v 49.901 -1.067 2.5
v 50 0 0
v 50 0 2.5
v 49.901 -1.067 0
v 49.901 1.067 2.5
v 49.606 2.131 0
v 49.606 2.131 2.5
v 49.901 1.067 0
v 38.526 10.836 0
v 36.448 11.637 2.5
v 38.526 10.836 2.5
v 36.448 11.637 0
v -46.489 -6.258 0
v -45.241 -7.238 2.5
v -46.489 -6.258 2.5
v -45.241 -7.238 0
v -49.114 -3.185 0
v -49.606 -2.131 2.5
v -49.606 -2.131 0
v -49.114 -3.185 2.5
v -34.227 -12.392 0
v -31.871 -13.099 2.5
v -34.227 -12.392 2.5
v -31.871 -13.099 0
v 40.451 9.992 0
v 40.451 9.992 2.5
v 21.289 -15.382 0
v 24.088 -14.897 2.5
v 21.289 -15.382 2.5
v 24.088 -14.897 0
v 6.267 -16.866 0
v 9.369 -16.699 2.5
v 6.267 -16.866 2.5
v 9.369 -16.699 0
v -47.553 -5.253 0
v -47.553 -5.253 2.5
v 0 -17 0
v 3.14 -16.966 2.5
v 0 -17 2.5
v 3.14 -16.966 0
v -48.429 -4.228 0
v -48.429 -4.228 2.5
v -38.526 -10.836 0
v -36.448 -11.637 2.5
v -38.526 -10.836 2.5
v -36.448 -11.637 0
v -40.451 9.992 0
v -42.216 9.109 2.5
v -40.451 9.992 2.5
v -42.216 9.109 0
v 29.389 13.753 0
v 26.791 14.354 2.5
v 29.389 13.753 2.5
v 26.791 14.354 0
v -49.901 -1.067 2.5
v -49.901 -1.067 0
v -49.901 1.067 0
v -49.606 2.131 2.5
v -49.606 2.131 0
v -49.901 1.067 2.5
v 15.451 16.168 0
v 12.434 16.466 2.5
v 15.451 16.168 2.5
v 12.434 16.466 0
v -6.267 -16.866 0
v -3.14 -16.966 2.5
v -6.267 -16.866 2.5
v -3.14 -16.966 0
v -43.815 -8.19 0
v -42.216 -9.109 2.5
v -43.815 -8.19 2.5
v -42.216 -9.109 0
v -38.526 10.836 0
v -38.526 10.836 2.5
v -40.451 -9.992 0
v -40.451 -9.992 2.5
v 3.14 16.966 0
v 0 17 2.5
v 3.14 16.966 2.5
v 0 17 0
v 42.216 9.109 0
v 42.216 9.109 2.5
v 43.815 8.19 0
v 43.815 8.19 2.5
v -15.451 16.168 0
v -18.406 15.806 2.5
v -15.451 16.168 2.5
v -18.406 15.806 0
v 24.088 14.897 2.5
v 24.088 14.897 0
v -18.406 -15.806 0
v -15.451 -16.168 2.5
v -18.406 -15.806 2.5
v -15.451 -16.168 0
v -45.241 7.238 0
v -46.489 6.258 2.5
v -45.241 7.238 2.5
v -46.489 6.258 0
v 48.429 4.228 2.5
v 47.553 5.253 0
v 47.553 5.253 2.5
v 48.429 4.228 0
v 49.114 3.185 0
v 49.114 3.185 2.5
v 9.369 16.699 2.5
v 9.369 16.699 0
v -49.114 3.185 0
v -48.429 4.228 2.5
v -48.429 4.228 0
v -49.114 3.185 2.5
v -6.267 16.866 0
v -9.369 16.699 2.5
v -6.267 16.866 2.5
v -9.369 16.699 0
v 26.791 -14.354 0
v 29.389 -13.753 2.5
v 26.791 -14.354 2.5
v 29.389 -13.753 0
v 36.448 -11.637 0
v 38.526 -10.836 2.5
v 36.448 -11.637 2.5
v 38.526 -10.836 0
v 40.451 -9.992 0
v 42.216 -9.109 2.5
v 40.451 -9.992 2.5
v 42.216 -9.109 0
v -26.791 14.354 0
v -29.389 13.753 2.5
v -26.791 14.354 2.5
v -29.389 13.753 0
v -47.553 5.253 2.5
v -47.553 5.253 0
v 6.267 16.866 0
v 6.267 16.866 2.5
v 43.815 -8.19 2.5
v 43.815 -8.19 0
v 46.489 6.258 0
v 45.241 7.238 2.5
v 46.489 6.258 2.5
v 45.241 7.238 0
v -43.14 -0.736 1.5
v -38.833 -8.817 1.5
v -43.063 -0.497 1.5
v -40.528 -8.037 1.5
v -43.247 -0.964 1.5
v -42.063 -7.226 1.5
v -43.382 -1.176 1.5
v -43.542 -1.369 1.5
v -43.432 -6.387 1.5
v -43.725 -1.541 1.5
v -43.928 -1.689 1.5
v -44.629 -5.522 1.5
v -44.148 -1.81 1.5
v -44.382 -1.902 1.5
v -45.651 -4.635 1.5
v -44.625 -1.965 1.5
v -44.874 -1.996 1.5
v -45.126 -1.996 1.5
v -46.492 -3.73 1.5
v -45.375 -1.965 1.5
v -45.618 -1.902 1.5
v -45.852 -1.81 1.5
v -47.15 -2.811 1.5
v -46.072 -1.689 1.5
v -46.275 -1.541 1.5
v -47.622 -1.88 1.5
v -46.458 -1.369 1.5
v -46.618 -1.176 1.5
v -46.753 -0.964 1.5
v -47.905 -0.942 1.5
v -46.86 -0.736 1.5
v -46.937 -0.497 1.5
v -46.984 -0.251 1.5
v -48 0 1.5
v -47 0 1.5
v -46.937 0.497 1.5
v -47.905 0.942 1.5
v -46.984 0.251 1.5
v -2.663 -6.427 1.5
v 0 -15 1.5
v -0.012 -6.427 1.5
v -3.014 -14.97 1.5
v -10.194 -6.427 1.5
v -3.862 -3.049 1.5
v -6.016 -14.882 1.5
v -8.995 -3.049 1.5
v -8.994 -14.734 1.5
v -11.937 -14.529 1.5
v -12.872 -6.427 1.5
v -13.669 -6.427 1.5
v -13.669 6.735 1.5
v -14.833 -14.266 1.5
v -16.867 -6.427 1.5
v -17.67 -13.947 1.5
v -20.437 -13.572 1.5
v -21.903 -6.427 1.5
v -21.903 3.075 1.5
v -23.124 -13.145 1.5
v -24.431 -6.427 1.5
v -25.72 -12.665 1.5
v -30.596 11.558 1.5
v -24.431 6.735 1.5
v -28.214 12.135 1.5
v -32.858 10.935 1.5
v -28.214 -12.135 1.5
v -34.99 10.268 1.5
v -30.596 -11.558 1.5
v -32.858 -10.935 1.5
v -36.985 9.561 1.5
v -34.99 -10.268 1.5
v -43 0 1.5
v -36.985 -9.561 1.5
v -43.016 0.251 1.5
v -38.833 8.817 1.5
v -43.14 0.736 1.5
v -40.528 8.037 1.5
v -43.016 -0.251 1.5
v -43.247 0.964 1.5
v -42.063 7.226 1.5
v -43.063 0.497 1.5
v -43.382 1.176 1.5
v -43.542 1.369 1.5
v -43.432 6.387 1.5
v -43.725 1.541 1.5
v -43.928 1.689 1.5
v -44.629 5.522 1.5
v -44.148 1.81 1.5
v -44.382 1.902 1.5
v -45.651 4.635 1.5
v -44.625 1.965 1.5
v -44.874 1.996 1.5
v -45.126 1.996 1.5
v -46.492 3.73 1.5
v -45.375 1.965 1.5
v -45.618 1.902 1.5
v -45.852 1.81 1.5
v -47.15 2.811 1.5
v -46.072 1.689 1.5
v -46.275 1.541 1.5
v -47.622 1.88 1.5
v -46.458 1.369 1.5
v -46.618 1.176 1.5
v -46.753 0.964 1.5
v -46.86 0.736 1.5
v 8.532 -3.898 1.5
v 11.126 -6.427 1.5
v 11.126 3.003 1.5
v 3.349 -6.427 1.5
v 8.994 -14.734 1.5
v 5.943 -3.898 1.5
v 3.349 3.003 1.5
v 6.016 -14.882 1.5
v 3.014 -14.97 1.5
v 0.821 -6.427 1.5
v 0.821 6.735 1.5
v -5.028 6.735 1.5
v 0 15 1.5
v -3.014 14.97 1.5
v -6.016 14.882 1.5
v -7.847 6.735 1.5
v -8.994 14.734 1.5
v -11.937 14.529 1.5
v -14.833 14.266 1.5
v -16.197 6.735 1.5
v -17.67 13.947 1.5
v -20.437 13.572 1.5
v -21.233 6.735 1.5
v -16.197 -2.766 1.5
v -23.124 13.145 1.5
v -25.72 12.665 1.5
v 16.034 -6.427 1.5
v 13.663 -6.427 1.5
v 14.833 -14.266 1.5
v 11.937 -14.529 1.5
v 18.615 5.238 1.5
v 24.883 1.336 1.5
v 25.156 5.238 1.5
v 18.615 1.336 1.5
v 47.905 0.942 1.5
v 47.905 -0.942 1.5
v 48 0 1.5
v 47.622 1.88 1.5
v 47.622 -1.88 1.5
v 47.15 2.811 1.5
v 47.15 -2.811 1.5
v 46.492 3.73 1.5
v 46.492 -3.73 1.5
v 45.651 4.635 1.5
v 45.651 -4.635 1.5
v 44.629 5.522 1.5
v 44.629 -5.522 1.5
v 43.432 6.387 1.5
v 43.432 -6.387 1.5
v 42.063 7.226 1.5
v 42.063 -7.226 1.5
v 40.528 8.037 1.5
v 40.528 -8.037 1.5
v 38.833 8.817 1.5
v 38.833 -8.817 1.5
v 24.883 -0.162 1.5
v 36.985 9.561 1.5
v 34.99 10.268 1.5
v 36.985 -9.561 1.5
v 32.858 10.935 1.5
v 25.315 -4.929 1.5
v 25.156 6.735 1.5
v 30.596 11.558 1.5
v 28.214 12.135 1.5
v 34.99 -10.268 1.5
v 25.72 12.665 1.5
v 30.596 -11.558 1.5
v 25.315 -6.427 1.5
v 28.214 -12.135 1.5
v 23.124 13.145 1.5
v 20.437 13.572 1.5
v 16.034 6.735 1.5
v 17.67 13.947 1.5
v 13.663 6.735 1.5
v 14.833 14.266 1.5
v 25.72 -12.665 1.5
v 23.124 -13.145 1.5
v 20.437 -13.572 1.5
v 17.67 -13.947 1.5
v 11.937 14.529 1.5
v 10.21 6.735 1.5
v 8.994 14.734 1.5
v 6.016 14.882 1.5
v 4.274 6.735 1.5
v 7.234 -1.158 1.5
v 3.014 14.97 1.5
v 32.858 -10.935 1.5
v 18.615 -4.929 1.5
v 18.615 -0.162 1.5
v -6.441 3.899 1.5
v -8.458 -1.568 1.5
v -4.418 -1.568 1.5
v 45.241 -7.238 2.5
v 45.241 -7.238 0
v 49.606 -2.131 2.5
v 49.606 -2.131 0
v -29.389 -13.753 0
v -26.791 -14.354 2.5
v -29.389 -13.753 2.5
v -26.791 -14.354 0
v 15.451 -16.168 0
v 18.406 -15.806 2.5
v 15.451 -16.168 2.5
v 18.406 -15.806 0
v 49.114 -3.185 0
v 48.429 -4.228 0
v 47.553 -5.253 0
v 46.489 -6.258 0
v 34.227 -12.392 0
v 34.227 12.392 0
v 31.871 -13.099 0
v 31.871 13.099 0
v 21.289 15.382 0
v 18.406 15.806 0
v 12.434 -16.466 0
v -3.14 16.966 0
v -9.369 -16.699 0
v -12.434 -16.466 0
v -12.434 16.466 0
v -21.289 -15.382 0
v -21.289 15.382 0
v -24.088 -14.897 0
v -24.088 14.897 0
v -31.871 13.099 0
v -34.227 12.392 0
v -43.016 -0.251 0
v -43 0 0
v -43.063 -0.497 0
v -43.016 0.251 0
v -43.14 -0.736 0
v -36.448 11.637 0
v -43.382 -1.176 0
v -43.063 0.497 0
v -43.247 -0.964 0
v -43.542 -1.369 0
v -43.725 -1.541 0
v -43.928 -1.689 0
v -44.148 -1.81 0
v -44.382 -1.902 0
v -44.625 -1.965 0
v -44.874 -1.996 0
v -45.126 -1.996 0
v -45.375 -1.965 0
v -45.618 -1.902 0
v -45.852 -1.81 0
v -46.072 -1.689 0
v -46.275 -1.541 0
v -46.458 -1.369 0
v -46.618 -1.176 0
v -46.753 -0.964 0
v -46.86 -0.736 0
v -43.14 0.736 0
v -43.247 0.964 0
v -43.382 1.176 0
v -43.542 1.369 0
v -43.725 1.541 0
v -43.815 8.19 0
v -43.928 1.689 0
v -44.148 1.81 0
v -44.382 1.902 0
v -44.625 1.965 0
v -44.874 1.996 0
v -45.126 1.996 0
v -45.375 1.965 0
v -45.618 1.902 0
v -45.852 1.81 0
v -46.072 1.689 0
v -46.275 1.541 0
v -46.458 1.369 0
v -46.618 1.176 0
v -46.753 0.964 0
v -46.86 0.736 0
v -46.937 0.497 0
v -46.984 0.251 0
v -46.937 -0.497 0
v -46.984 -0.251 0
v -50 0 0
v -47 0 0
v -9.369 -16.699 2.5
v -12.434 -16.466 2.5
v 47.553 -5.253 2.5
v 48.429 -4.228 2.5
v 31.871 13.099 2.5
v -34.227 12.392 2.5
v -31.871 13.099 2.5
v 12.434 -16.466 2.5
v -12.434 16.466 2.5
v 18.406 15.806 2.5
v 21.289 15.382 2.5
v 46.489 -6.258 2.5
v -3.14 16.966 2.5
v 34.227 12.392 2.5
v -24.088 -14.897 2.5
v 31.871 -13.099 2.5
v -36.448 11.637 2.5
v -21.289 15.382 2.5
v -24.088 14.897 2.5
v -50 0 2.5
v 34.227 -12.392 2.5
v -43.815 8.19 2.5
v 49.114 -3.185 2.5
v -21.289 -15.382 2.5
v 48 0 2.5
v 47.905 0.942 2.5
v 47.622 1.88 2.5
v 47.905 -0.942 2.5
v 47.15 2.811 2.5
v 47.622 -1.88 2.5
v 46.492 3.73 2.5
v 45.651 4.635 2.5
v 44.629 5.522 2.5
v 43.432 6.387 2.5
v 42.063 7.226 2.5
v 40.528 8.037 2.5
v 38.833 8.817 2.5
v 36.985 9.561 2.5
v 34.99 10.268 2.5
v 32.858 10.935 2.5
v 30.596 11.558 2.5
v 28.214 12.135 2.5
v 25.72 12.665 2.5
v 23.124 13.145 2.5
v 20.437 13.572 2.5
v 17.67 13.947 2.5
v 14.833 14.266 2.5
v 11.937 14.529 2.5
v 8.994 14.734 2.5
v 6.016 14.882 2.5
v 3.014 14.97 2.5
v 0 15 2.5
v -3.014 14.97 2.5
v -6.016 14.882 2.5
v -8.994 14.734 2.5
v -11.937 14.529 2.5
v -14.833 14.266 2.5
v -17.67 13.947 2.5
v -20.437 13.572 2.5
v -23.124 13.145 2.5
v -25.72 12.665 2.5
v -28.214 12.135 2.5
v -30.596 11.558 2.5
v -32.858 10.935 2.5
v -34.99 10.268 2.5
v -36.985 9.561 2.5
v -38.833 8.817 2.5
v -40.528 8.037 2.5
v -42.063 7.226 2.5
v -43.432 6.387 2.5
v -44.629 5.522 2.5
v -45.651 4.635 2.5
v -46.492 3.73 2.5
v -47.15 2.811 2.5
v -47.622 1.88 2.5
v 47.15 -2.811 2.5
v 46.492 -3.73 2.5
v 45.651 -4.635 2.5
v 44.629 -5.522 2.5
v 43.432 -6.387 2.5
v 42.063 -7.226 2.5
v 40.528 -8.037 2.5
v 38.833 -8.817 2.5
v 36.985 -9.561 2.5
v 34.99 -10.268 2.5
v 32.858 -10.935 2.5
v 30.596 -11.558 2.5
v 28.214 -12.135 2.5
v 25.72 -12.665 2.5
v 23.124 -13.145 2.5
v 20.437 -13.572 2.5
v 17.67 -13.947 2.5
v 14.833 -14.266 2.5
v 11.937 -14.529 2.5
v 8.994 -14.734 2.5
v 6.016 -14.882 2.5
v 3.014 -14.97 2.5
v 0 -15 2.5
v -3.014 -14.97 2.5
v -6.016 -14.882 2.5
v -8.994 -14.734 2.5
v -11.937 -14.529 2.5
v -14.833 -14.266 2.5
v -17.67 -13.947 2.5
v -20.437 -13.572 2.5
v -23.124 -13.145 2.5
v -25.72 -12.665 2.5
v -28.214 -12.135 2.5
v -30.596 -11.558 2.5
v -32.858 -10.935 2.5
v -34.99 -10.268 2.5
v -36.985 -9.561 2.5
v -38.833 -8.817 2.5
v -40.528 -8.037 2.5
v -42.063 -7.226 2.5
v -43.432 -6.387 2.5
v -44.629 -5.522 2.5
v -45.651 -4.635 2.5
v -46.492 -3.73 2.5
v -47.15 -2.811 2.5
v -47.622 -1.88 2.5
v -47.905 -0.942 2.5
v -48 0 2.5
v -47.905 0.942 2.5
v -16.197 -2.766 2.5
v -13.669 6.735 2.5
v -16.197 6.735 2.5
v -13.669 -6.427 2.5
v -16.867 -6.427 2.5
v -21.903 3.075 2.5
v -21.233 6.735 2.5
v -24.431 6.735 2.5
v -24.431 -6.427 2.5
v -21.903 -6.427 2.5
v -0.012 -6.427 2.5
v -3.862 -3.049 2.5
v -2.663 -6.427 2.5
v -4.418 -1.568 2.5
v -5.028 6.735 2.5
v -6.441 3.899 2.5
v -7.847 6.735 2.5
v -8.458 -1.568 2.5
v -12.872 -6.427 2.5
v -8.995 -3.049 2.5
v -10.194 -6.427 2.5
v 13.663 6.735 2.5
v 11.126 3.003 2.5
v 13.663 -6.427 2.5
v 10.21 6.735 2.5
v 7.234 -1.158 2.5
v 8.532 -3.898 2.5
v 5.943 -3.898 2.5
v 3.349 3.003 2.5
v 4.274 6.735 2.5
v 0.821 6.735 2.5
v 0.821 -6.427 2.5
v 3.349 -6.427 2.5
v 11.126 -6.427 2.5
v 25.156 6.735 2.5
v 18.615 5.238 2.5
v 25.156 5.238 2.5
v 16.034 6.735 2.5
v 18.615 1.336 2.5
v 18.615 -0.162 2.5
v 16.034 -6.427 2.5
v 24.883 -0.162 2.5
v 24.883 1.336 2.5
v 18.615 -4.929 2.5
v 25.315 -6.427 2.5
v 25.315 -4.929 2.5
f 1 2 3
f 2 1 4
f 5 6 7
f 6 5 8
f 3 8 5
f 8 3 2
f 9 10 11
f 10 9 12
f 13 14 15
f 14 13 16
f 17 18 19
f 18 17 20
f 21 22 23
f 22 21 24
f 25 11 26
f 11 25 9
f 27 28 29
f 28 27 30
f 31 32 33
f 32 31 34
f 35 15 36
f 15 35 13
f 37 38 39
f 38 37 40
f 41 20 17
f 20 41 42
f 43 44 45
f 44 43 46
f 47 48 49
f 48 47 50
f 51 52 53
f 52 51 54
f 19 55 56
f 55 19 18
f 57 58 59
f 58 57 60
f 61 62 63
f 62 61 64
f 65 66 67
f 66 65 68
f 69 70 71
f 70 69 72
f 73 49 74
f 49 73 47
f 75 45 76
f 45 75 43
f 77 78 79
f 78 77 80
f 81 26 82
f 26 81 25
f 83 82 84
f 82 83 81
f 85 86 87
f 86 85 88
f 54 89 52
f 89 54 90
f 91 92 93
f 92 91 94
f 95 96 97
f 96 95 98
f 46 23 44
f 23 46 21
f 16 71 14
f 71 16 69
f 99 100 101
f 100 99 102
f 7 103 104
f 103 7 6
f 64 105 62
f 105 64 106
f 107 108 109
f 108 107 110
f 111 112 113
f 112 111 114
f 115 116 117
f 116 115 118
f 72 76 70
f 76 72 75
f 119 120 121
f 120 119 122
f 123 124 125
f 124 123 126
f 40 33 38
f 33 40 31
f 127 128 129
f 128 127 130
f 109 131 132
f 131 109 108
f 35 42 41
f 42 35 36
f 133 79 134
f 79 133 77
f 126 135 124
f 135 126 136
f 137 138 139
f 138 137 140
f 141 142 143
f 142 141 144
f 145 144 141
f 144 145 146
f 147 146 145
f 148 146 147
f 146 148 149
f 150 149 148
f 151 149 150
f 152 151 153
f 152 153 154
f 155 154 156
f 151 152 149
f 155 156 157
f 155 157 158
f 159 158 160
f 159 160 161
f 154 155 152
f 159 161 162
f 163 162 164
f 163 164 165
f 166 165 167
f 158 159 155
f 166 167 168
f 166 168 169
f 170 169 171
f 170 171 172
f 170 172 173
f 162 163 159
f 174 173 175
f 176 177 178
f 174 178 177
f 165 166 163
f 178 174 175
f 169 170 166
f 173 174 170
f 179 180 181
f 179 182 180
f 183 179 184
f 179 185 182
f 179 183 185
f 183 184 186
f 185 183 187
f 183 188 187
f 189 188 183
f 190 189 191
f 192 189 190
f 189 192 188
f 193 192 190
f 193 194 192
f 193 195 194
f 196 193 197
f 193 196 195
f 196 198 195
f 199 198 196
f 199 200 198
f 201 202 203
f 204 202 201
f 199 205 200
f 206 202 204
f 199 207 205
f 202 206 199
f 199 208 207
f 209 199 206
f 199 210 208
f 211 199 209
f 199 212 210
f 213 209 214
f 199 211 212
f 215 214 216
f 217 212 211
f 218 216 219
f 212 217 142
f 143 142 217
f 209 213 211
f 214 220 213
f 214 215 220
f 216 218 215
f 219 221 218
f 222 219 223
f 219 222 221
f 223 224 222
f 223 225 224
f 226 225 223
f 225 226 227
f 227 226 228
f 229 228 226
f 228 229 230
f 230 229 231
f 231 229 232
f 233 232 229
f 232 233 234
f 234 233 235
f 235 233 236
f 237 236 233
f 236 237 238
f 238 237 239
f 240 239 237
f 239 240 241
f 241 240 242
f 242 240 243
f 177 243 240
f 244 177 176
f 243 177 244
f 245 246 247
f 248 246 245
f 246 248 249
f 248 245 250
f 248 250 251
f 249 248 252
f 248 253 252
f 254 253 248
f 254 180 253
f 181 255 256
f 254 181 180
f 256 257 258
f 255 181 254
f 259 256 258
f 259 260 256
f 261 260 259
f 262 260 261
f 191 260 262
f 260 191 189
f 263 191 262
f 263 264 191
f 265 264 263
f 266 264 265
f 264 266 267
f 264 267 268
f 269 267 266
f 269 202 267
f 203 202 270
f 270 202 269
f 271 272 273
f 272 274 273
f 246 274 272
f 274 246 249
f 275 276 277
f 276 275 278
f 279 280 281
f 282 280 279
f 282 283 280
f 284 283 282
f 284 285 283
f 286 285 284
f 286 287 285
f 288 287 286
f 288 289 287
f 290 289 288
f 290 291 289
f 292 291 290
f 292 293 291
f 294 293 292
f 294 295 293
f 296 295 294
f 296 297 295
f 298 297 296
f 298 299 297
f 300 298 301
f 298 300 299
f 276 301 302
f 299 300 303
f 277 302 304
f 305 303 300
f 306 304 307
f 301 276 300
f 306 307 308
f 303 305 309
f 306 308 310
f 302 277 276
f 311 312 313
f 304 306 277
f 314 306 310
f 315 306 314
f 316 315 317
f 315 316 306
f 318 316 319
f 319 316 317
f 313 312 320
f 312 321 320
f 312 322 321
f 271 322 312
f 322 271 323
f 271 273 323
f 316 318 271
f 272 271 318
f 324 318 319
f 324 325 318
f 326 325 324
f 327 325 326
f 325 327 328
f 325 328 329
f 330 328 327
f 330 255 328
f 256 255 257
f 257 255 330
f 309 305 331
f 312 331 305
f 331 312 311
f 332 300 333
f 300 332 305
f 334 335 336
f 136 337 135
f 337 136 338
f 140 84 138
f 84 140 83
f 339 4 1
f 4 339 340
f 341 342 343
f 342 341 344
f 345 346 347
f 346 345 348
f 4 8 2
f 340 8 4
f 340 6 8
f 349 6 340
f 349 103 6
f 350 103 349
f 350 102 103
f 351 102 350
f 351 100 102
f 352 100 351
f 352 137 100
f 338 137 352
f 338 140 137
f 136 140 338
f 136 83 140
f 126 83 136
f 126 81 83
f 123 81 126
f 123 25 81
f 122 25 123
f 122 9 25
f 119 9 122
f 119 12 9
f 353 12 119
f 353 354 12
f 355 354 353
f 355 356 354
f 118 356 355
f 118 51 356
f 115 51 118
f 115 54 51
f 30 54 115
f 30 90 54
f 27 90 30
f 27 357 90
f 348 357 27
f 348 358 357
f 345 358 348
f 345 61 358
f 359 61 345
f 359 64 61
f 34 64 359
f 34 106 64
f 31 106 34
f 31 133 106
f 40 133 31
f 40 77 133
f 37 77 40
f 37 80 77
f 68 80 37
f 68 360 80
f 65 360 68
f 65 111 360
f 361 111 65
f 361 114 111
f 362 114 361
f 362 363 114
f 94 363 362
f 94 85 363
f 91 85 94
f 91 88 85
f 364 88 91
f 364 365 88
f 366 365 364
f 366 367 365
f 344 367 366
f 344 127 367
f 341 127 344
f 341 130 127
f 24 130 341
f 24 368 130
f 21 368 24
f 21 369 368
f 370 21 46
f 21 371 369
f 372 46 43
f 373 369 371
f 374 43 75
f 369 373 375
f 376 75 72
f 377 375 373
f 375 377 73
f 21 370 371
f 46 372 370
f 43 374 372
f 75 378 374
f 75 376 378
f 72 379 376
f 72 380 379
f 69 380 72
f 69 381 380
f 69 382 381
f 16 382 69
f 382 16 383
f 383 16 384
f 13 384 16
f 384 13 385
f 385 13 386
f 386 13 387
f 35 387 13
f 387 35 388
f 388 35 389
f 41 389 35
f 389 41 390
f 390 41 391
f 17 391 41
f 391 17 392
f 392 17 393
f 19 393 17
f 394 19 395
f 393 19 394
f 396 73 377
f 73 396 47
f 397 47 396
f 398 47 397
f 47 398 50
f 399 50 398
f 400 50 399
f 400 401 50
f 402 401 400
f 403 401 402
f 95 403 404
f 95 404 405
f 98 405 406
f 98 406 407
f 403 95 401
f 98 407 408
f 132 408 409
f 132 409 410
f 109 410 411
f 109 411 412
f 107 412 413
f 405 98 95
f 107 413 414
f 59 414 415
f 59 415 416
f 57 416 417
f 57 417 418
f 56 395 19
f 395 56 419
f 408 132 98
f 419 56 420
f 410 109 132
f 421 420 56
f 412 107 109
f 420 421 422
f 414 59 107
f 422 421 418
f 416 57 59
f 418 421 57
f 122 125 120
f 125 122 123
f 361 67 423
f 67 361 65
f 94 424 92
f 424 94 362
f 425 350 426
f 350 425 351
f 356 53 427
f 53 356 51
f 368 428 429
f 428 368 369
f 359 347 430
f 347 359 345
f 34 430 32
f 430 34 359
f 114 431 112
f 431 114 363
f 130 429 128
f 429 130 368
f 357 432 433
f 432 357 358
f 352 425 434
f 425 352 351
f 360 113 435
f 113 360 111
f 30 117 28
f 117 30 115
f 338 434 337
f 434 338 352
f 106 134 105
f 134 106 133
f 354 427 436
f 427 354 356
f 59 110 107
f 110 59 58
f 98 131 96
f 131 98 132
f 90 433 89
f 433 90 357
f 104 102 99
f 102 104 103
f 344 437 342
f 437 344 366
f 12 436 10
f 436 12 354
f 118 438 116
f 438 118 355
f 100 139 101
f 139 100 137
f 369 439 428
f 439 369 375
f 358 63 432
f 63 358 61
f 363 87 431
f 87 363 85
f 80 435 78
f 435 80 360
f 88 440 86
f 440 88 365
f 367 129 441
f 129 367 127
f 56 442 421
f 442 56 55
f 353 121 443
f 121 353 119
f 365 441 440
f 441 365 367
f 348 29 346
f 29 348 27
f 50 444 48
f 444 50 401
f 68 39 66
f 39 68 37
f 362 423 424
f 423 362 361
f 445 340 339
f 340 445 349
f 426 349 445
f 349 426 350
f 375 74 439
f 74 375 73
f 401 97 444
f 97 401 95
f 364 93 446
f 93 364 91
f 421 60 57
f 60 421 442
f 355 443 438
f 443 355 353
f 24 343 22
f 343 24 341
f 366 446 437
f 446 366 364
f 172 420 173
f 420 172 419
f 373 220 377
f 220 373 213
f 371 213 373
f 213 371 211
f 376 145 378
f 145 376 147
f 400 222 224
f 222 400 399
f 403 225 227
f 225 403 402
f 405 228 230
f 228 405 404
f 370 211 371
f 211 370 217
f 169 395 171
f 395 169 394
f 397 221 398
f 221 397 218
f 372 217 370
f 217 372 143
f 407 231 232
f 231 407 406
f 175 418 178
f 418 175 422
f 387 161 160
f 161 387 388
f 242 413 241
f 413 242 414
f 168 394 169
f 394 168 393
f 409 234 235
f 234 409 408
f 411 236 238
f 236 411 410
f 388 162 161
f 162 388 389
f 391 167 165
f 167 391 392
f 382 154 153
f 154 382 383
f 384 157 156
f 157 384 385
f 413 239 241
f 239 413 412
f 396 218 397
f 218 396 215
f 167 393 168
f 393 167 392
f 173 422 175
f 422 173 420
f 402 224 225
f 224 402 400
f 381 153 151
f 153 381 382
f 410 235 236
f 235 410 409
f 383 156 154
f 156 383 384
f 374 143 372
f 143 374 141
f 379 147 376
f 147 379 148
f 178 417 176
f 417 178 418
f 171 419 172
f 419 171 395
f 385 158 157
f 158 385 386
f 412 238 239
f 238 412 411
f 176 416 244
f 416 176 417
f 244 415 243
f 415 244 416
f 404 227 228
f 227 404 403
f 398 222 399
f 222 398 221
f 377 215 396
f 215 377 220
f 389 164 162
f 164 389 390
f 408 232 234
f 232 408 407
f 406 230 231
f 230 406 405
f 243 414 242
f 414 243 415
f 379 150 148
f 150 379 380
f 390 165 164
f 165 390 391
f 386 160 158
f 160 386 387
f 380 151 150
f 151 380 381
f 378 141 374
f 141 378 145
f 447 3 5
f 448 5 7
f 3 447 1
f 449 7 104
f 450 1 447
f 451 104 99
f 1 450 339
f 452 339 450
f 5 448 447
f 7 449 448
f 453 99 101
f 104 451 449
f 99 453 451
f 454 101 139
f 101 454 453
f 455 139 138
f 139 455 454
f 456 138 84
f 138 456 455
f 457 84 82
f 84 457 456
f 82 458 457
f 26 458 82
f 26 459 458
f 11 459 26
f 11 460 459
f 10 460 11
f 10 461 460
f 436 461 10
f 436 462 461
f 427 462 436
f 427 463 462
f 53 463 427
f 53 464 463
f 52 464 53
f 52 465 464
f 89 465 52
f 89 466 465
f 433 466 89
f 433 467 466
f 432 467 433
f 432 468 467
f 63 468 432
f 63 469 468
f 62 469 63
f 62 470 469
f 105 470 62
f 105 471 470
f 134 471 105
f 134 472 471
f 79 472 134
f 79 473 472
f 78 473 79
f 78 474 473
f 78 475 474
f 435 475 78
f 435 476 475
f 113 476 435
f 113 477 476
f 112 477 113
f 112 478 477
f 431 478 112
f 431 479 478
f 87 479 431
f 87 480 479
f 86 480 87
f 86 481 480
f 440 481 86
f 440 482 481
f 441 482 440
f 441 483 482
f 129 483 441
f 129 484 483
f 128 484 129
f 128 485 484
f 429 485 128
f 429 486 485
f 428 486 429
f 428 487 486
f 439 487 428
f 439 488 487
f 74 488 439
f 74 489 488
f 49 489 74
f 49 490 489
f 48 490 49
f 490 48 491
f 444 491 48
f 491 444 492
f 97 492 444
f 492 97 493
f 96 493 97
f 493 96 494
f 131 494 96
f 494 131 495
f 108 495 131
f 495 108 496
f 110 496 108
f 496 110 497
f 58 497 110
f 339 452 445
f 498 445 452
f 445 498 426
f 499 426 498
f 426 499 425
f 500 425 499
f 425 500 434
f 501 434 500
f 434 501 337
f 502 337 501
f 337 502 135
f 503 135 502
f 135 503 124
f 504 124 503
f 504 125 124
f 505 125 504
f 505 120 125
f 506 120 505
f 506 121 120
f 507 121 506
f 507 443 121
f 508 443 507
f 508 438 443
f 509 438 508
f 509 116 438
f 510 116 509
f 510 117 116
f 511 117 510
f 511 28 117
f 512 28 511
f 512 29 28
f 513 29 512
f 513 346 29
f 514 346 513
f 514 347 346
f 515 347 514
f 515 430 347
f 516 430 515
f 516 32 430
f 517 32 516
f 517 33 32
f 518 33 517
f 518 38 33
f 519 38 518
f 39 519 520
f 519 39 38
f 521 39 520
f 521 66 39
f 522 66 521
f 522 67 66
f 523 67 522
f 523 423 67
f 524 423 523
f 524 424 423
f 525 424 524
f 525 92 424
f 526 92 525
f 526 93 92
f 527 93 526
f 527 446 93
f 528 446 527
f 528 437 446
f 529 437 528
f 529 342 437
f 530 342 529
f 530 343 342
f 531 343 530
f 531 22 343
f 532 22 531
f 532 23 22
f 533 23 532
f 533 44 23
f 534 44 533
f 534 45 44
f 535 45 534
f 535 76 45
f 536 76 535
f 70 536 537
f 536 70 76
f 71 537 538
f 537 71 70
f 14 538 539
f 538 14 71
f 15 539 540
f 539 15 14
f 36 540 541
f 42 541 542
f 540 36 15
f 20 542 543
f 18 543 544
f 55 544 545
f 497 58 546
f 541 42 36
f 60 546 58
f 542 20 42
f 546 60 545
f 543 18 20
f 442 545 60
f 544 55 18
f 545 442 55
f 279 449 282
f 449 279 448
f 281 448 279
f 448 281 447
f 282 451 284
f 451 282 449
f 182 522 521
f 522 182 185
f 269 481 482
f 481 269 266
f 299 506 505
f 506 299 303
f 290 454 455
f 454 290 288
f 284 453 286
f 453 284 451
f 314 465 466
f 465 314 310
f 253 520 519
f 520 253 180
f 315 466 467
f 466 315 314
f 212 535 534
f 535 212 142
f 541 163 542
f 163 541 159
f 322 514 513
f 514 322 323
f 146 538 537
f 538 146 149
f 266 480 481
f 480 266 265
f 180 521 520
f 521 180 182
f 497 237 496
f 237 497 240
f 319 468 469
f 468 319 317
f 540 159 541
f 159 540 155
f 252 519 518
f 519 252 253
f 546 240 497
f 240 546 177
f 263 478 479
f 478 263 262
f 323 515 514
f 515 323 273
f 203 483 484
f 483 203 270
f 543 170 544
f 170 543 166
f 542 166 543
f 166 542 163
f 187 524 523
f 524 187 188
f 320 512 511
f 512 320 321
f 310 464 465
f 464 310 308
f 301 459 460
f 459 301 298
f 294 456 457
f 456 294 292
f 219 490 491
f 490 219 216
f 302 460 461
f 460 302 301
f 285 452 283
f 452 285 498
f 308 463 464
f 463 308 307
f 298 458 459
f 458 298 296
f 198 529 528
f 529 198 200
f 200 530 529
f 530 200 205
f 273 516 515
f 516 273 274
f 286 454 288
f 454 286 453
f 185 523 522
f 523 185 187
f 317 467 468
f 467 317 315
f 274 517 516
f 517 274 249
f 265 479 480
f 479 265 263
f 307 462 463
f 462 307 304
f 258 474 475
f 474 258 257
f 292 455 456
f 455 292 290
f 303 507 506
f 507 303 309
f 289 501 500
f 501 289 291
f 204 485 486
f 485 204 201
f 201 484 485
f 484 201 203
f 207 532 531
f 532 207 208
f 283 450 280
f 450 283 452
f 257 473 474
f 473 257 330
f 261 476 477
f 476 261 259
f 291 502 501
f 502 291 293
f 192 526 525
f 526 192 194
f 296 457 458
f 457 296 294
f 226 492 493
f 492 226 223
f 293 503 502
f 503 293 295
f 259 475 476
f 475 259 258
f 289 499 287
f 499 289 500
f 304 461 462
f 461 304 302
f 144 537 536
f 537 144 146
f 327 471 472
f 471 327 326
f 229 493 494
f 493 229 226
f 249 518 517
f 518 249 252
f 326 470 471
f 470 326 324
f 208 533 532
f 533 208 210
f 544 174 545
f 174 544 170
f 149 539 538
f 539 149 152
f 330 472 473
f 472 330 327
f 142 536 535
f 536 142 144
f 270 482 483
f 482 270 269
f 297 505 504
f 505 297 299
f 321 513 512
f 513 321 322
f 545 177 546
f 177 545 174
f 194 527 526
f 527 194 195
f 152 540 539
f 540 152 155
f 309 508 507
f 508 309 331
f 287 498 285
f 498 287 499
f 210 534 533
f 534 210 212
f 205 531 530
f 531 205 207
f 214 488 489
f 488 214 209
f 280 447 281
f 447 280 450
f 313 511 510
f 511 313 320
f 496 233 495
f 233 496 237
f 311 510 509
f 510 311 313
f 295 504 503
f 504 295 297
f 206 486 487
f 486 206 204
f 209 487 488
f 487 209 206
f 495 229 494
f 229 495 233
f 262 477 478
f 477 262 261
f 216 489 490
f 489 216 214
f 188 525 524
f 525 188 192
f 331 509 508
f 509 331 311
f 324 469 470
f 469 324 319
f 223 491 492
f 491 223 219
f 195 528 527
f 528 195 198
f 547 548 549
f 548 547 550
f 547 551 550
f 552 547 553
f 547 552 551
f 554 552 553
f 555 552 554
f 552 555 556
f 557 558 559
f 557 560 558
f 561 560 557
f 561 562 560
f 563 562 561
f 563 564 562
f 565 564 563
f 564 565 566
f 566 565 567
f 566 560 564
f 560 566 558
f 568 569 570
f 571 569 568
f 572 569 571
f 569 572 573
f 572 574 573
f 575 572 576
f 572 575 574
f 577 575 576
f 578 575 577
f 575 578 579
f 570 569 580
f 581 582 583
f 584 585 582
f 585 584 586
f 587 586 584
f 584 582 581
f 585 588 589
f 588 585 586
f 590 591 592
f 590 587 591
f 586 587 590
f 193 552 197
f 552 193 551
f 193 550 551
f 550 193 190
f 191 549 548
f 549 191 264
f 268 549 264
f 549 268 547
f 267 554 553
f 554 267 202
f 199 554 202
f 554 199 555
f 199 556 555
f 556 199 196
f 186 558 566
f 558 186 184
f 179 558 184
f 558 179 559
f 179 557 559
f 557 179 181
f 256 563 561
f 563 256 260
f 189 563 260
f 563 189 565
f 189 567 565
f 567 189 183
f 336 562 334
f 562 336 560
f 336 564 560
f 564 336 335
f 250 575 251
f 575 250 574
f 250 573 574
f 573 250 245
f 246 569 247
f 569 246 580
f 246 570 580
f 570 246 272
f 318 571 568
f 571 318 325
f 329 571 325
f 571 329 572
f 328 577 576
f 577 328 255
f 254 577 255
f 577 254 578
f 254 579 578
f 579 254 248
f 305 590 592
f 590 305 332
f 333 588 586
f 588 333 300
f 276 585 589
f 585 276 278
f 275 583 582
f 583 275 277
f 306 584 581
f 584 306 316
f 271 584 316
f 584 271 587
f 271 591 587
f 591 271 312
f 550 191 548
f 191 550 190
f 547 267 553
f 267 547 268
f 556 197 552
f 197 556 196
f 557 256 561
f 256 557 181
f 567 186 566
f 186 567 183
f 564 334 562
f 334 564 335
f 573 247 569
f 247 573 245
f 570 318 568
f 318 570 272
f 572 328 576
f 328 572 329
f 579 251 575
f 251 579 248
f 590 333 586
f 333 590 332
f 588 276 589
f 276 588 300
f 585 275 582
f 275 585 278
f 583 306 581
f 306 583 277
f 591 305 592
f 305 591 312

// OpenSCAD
// Single-Layer Oval Zipper Pull Template with Raised Text
// Creates a blue base oval with raised white text and a hole for zipper attachment

// Parameters - these can be overridden from command line
name = "NAME"; // Text to display on zipper pull
oval_width = 96; // Width of blue oval (mm) - total with border will be 100mm (96 + 2*2)
oval_height = 30; // Height of blue oval (mm) - total with border will be 34mm (30 + 2*2)
base_thickness = 1.5; // Thickness of blue base layer (mm)
text_thickness = 1; // Thickness of raised white text (mm)
base_text_size = 13; // Base font size for medium names
font_file = "C:/Users/Fred/claude/Fordscript.ttf"; // Path to the custom font file

// Dynamic font sizing based on name length (mimics Ford oval proportions)
// "Fred" (4 chars) at 13mm gives ~20% coverage - our target
name_length = len(name);
text_size = name_length <= 3 ? 18 :      // Short names (Zoe, Sam, Al) - larger
            name_length <= 5 ? 13 :      // Medium names (Fred, John, Mary) - standard
            name_length <= 8 ? 11 :      // Longer names (Michael, Jessica) - smaller
            9;                           // Very long names (Christopher) - smallest

// Border parameters
border_width = 2; // Width of the white border around the oval (mm)
border_thickness = 1; // Thickness of the white border (mm)

// Hole parameters for zipper pull
hole_diameter = 4; // Diameter of the hole (mm)
hole_clearance = 3; // Minimum clearance from edge of outer border (mm) - increased to fully clear white border

// Module to create an oval (ellipse)
module oval(width, height, depth) {
    scale([width/2, height/2, 1])
        cylinder(h=depth, r=1, $fn=100);
}

// Blue base layer with hole
module base_layer() {
    color("RoyalBlue")
    difference() {
        // Blue base matches the outer size of the white border
        oval(oval_width + border_width*2, oval_height + border_width*2, base_thickness);

        // Hole for zipper pull - positioned relative to outer edge
        // Total width = oval_width + border_width*2
        // Position: left edge + hole_radius + clearance
        total_width = oval_width + border_width*2;
        hole_x = -(total_width/2) + (hole_diameter/2) + hole_clearance;
        translate([hole_x, 0, -0.05])
            cylinder(h=base_thickness + 0.1, d=hole_diameter, $fn=50);
    }
}

// White border around the oval
module white_border() {
    color("white")
    translate([0, 0, base_thickness])
        difference() {
            // Outer oval (larger)
            oval(oval_width + border_width*2, oval_height + border_width*2, border_thickness);
            // Inner oval (cut out the center)
            translate([0, 0, -0.05])
                oval(oval_width, oval_height, border_thickness + 0.1);
        }
}

// Raised white text on top of base - REDUCED bold effect (3 renders instead of 9)
module raised_text() {
    color("white")
    // Reduced bold effect - only 3 offsets
    for (x = [-0.4, 0, 0.4]) {
        translate([x, 0, base_thickness])
            linear_extrude(height=text_thickness)
                text(name,
                     size=text_size,
                     font="Fordscript",
                     halign="center",
                     valign="center");
    }
}

// Main zipper pull assembly
module zipper_pull() {
    base_layer();
    white_border();
    raised_text();
}

// Generate the zipper pull
zipper_pull();
